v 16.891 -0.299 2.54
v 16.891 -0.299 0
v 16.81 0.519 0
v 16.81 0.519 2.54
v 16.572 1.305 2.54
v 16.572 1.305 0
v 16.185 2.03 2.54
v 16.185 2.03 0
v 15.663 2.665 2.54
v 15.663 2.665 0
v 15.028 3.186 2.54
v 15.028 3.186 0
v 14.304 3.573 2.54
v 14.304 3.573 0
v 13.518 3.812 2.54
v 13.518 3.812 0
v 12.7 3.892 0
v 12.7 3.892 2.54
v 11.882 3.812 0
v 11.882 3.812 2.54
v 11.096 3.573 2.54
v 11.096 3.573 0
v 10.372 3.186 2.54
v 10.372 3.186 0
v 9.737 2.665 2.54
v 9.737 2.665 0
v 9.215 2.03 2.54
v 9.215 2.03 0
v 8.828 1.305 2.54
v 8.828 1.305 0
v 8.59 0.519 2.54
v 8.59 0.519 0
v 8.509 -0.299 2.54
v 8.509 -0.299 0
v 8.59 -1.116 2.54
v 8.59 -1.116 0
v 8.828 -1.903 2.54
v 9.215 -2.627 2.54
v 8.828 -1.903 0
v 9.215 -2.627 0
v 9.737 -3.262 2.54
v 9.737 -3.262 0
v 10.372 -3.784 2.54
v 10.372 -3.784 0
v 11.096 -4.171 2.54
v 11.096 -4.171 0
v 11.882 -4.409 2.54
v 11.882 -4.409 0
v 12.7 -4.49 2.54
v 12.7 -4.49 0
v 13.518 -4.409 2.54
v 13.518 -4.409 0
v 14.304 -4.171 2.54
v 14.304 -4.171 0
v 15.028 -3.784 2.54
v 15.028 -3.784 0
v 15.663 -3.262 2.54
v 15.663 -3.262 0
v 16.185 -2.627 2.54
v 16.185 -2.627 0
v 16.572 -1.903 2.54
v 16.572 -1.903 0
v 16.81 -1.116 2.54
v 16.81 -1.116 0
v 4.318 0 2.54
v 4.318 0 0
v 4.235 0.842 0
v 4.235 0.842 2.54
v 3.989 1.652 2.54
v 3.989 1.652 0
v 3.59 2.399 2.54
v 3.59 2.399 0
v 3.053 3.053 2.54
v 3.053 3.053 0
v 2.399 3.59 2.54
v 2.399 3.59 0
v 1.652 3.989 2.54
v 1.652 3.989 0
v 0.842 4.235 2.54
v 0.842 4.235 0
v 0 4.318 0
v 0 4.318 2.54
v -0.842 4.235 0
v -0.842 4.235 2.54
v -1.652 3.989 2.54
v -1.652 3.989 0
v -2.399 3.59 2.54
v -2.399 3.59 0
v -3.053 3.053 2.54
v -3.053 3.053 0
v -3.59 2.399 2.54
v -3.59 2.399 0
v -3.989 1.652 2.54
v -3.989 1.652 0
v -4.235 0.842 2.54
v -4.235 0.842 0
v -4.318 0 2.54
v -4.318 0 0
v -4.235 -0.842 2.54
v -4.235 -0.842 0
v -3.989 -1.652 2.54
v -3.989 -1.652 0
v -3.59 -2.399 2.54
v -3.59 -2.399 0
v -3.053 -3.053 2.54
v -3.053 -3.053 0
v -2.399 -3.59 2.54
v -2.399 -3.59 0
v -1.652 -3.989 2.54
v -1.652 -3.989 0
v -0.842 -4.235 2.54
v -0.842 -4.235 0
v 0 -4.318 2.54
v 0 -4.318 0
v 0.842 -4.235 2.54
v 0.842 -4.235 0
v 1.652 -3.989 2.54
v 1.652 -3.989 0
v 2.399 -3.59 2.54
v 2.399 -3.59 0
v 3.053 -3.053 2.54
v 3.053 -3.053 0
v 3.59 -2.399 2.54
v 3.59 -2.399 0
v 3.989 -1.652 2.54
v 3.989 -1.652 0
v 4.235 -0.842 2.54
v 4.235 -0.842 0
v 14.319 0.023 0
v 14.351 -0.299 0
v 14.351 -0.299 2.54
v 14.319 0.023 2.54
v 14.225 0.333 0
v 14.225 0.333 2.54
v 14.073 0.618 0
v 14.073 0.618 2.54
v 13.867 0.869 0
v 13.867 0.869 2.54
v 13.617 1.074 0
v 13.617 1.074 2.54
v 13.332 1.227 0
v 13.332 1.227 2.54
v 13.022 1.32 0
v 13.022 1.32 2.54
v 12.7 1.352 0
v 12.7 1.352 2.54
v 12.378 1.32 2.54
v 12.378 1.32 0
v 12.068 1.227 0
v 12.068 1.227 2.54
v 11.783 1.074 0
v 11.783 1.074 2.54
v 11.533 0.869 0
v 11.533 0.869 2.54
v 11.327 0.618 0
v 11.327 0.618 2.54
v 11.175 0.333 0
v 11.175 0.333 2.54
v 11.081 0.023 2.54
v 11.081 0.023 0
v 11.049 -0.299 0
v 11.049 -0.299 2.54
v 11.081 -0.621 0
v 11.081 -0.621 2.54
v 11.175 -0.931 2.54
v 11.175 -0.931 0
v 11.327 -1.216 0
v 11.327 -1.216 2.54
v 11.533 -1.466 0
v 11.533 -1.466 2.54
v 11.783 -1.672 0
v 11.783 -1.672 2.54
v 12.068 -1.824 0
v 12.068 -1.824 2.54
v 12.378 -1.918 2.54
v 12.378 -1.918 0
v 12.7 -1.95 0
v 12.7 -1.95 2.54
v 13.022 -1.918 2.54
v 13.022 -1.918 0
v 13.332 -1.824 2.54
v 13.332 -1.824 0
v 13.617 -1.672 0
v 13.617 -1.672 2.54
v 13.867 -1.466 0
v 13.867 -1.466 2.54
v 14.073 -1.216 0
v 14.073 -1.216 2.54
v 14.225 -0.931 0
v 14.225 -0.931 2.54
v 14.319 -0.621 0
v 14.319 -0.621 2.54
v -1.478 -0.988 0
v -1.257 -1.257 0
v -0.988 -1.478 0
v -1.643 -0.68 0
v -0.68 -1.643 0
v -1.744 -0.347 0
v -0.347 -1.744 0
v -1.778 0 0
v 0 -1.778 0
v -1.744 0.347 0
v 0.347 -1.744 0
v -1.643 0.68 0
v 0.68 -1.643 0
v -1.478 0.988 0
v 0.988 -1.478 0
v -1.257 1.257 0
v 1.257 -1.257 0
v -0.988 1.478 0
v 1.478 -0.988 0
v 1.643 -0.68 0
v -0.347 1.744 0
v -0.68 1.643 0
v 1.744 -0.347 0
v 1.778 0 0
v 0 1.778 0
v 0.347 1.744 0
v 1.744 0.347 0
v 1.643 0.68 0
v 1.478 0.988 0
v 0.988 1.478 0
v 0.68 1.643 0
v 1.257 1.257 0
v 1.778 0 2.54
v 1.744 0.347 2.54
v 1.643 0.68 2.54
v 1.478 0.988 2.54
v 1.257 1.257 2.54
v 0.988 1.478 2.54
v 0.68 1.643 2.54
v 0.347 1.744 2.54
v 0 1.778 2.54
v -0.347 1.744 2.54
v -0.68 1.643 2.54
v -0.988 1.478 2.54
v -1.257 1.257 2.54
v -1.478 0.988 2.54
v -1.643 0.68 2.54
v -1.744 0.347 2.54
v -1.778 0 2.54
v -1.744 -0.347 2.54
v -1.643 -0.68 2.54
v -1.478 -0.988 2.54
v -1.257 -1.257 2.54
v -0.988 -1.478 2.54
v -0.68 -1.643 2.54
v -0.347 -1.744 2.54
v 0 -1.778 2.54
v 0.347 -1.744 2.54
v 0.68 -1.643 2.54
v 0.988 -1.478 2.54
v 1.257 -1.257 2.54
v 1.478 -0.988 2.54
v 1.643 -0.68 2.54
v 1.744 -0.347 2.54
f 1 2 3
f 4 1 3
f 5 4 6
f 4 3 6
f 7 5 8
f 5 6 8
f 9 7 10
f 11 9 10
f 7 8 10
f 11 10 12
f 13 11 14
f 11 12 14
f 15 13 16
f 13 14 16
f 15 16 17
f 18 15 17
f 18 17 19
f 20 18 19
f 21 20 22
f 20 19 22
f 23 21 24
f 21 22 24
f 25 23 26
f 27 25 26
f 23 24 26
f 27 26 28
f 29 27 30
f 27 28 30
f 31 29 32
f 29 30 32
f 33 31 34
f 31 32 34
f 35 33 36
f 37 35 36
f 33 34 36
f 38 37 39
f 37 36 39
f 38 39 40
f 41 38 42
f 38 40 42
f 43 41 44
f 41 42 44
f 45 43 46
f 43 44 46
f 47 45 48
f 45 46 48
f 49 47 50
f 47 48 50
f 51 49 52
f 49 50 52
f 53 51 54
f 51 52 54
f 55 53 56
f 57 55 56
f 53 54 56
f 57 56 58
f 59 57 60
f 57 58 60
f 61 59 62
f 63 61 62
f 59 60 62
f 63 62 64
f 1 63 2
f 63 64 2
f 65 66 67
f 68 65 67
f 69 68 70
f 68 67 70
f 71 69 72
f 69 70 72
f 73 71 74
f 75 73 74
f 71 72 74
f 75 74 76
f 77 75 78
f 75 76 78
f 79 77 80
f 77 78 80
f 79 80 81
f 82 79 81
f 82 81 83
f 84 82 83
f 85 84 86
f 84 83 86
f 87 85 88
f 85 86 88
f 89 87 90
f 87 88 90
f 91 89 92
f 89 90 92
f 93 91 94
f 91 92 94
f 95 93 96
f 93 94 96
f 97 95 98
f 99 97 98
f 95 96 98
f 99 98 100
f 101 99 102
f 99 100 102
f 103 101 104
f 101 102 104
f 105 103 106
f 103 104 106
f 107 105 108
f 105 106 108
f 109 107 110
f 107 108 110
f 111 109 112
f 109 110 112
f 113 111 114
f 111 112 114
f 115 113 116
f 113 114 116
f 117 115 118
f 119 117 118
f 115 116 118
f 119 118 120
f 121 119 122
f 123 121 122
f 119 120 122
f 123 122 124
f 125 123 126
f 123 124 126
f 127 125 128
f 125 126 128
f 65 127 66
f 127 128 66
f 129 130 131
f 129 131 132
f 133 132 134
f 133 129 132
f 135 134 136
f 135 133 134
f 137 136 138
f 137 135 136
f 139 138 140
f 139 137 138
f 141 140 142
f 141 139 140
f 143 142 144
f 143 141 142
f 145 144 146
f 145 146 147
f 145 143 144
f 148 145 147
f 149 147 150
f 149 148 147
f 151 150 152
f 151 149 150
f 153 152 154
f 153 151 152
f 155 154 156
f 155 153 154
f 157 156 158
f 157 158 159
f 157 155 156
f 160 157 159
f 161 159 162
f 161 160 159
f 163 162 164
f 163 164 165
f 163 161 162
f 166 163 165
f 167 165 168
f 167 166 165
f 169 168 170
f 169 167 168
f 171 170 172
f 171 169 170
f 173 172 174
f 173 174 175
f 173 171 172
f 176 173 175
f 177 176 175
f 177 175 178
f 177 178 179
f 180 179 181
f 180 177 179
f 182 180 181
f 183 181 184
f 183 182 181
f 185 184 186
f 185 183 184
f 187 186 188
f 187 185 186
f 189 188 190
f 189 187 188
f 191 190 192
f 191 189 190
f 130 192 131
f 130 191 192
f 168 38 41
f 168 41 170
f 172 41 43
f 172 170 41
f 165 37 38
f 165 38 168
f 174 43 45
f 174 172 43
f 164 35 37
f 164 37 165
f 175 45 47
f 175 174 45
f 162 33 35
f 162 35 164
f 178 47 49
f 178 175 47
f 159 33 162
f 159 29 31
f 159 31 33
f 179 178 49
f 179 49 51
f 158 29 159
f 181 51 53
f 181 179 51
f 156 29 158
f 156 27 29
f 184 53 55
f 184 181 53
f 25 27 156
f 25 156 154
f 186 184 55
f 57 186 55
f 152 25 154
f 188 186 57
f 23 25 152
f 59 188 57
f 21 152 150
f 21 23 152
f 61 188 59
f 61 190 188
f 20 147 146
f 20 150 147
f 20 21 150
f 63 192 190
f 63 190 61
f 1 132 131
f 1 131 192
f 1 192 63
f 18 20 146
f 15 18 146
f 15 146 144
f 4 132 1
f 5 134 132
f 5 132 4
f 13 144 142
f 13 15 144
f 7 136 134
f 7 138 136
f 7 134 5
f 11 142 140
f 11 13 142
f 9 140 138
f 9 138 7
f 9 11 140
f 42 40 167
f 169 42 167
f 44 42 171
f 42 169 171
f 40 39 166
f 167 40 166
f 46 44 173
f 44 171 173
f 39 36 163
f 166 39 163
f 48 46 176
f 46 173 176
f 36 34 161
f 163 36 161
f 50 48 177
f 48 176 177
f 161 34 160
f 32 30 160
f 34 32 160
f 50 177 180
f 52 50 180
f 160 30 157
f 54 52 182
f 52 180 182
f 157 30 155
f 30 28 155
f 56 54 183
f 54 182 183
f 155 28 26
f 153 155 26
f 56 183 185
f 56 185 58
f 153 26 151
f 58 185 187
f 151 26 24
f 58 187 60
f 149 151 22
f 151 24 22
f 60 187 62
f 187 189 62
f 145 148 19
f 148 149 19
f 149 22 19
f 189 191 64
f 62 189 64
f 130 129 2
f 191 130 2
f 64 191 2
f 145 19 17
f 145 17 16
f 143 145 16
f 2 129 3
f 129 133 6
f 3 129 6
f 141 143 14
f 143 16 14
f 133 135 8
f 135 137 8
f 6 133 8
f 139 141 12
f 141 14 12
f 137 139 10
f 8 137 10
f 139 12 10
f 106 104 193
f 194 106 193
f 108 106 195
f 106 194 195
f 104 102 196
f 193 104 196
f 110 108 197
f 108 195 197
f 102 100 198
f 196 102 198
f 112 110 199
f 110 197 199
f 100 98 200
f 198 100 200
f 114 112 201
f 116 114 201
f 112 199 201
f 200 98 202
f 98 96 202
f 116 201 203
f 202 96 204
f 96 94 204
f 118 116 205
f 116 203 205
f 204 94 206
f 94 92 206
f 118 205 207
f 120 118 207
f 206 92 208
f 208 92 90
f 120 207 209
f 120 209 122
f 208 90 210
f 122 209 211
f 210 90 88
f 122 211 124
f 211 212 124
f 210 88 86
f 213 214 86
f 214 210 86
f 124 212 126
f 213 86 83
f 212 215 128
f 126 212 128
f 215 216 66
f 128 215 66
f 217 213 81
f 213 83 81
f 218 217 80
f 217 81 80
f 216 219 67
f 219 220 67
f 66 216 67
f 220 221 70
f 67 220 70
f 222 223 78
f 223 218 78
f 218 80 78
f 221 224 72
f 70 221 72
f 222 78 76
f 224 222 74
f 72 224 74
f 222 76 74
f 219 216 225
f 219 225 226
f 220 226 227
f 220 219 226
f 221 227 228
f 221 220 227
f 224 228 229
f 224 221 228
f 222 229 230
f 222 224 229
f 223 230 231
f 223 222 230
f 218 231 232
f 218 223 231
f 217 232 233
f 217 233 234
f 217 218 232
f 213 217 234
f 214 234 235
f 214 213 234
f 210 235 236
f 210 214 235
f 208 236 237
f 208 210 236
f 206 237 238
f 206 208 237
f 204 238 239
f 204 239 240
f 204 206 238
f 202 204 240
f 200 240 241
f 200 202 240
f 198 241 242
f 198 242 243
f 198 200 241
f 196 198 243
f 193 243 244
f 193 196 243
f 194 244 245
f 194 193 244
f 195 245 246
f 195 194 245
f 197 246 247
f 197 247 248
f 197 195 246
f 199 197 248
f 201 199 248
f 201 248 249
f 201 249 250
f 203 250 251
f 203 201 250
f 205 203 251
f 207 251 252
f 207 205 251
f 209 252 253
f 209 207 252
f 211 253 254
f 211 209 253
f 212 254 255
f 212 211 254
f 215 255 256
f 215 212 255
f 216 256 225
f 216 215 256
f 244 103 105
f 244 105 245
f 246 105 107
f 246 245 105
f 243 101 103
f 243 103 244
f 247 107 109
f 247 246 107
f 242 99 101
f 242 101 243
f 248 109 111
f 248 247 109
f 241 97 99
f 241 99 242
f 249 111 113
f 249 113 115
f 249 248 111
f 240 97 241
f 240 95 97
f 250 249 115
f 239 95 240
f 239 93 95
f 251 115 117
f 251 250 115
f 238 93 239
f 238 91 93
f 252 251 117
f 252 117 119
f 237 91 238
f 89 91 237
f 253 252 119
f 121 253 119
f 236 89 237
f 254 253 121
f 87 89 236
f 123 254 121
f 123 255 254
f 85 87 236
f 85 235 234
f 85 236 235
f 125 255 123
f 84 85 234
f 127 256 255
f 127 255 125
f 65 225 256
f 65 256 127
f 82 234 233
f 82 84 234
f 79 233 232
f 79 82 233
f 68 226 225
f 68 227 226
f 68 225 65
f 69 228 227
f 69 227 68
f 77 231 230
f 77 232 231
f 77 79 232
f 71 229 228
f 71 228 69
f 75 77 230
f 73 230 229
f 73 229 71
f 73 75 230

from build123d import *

# Parameters (mm, degrees)
SKETCH1_R             = 4.318
SKETCH1_R_2           = 1.778
BOSS_EXTRUDE1_DEPTH   = 2.54
SKETCH1_R_3           = 4.191
SKETCH1_R_4           = 1.651
BOSS_EXTRUDE1_2_DEPTH = 2.54


with BuildPart() as part:
    # Sketch1 → Boss-Extrude1 (new body)
    with BuildSketch(Plane.XY):
        Circle(SKETCH1_R)
        Circle(SKETCH1_R_2, mode=Mode.SUBTRACT)
    extrude(amount=BOSS_EXTRUDE1_DEPTH)


with BuildPart() as body_2:
    # Sketch1 → Boss-Extrude1 2 (new body)
    with BuildSketch(Plane.XY):
        with Locations((12.7, -0.298823529)):
            Circle(SKETCH1_R_3)
        with Locations((12.7, -0.298823529)):
            Circle(SKETCH1_R_4, mode=Mode.SUBTRACT)
    extrude(amount=BOSS_EXTRUDE1_2_DEPTH)


solid = Compound([part.part, body_2.part])
